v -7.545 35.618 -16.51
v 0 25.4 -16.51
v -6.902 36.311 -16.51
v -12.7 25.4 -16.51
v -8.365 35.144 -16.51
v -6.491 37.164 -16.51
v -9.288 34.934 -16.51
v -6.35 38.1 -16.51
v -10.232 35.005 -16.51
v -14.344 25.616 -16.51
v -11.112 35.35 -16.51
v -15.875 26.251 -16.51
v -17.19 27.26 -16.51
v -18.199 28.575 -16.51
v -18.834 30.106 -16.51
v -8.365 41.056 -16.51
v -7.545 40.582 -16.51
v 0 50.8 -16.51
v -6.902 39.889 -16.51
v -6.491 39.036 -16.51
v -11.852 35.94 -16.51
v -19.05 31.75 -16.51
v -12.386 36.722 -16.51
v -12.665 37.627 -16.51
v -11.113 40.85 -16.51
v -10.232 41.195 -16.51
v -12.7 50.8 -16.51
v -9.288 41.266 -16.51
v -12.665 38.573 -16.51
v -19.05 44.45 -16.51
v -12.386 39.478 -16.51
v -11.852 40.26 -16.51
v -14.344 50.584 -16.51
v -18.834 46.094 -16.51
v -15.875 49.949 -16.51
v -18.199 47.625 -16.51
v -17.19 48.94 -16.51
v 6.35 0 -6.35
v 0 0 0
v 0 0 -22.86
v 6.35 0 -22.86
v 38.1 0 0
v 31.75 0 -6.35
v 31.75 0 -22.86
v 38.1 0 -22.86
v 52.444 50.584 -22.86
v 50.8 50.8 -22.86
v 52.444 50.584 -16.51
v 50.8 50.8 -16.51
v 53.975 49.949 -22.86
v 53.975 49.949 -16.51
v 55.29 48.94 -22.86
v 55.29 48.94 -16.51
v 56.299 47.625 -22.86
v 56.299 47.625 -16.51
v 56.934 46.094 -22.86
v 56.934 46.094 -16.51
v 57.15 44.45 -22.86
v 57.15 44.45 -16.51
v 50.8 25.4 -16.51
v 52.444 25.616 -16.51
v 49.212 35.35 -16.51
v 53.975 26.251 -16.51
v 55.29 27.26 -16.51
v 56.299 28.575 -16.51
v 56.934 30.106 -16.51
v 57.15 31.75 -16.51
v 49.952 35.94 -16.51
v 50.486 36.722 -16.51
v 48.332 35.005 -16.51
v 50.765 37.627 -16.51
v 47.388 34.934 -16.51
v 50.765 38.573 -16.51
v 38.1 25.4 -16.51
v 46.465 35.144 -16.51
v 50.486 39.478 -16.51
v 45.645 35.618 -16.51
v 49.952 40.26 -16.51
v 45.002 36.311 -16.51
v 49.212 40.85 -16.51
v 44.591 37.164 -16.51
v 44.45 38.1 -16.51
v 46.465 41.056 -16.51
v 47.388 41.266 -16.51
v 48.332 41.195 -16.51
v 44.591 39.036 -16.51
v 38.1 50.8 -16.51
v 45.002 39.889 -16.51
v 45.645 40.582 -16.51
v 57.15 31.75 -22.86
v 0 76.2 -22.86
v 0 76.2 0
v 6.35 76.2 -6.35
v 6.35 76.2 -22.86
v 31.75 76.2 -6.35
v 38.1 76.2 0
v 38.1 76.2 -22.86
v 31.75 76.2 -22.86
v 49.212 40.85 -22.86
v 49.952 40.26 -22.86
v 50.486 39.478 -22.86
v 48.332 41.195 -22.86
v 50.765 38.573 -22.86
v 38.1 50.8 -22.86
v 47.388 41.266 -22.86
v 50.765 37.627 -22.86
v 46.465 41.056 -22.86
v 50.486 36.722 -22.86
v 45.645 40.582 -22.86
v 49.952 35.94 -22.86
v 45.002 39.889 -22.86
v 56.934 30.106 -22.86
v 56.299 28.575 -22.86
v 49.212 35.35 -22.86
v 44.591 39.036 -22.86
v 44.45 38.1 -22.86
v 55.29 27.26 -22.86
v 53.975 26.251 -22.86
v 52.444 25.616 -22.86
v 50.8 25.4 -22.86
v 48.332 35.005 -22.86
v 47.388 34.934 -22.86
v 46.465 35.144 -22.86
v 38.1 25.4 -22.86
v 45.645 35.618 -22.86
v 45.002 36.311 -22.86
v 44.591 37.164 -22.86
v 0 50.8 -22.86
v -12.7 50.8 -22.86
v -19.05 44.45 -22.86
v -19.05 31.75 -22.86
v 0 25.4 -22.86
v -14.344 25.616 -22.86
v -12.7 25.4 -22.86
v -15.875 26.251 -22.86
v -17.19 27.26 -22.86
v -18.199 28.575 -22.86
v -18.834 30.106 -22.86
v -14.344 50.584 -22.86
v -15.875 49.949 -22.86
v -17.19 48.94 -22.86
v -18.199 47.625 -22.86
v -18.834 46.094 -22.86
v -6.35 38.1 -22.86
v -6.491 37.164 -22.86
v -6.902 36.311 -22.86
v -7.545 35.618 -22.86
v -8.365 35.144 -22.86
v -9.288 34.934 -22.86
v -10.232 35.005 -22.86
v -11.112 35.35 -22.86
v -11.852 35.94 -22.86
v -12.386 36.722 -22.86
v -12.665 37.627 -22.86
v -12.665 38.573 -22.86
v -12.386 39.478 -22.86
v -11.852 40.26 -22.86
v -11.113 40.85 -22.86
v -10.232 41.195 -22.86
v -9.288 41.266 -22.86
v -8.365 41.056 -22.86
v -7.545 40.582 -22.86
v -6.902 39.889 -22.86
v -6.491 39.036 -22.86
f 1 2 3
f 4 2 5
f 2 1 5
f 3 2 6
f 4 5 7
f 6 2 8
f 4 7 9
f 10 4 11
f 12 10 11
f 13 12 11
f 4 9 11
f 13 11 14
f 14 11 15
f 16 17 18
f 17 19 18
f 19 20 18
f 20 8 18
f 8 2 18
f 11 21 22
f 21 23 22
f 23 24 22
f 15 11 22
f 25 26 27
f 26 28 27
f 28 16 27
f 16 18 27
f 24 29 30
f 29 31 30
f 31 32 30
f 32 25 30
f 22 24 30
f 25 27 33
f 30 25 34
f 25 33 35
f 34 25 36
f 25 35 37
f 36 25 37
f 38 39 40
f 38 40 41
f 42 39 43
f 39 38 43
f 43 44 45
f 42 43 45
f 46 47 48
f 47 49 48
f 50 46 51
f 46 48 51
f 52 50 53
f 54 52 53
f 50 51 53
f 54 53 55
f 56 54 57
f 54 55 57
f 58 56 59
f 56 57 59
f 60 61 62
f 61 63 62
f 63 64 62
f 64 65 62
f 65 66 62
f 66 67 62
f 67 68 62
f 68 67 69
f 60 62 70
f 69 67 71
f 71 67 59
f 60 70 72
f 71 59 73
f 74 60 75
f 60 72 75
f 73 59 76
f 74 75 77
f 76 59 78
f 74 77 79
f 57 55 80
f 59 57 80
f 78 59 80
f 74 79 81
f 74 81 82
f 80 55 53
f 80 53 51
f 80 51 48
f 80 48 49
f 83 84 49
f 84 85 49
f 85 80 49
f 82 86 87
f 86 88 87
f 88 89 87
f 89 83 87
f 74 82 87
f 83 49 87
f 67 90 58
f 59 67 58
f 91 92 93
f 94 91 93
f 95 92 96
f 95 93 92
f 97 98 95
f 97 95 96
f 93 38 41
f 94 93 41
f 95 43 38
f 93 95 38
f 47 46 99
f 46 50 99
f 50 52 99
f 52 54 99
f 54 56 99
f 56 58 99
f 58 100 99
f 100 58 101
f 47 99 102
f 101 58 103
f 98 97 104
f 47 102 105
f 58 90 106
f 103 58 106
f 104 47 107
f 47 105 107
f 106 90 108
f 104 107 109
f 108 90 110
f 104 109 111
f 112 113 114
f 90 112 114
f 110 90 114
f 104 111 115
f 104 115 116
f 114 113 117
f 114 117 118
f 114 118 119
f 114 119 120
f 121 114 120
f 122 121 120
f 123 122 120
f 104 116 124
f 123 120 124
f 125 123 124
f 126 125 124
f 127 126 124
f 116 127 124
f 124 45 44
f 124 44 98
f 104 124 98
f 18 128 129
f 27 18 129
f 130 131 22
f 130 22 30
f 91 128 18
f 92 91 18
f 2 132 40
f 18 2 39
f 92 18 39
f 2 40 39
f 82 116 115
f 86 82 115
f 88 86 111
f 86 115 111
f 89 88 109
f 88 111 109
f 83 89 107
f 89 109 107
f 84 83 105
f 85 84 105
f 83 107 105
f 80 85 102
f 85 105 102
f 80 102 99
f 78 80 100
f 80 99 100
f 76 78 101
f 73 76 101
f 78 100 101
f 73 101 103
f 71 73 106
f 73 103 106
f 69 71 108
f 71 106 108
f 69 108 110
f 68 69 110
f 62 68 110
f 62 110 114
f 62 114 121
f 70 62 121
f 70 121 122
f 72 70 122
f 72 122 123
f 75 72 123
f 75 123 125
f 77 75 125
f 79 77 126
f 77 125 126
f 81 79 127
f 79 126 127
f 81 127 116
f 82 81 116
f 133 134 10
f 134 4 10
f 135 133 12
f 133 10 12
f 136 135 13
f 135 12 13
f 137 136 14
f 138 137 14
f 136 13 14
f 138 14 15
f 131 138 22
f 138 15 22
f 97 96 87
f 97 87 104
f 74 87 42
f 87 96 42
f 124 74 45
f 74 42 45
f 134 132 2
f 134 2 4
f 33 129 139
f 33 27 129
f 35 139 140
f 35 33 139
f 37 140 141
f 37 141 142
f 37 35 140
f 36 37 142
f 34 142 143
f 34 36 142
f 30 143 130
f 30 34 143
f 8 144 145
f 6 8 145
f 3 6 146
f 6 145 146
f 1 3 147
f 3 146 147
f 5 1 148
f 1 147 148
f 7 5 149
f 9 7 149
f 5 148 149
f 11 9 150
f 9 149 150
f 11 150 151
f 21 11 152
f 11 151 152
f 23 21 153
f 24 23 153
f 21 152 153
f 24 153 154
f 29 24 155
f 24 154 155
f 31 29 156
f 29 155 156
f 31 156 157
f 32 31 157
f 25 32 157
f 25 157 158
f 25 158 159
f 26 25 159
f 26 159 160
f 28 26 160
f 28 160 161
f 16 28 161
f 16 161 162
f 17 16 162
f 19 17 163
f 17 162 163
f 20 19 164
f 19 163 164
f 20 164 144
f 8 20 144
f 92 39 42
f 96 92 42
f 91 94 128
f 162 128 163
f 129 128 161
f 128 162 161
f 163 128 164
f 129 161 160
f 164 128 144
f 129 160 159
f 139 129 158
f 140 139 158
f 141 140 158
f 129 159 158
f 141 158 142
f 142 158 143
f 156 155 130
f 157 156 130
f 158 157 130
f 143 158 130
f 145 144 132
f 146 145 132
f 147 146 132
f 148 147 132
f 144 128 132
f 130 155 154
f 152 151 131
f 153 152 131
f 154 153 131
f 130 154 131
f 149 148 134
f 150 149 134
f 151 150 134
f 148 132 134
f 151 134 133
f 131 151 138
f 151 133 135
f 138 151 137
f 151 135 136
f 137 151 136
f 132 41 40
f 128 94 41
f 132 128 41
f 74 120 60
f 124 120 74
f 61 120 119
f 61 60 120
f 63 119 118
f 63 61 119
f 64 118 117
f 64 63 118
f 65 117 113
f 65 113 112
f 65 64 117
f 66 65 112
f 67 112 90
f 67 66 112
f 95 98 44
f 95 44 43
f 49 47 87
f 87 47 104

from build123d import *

# Parameters (mm, degrees)
BOSS_EXTRUDE1_DEPTH = 76.2
SKETCH3_R           = 2.5019
BOSS_EXTRUDE2_DEPTH = 6.35
SKETCH4_W           = 19.05
SKETCH4_H           = 25.4
SKETCH4_R           = 3.175
BOSS_EXTRUDE3_DEPTH = 6.35
FILLET1_R           = 6.35
CUT_EXTRUDE1_REACH  = 99.955


with BuildPart() as part:
    # Sketch2 → Boss-Extrude1 (new body)
    with BuildSketch(Plane(origin=(0, 0, 0), x_dir=(1, 0, 0), z_dir=(0, 1, 0))):
        Polygon((0, 22.86), (0, 0), (38.1, 0), (38.1, 22.86), (31.75, 22.86), (31.75, 6.35), (6.35, 6.35), (6.35, 22.86), align=None)
    extrude(amount=BOSS_EXTRUDE1_DEPTH)

    # Sketch3 → Boss-Extrude2 (add)
    with BuildSketch(Plane.XY):
        with BuildLine():
            Line((19.05, 50.8), (-19.05, 50.8))
            ThreePointArc((-19.05, 50.8), (-31.75, 38.1), (-19.05, 25.4))
            Line((-19.05, 25.4), (19.05, 25.4))
            ThreePointArc((19.05, 25.4), (31.75, 38.1), (19.05, 50.8))
        make_face()
        with Locations((-19.05, 38.1)):
            Circle(SKETCH3_R, mode=Mode.SUBTRACT)
    extrude(amount=-BOSS_EXTRUDE2_DEPTH)

    # Sketch4 → Boss-Extrude3 (add)
    # profile 1 of 2: a face of its own
    with BuildSketch(Plane(origin=(0, 0, -22.86), x_dir=(-1, 0, 0), z_dir=(0, 0, -1))):
        with Locations((-47.625, 38.1)):
            Rectangle(SKETCH4_W, SKETCH4_H)
        with Locations((-47.625, 38.1)):
            Circle(SKETCH4_R, mode=Mode.SUBTRACT)
    # profile 2 of 2: a face of its own
    with BuildSketch(Plane(origin=(0, 0, -22.86), x_dir=(-1, 0, 0), z_dir=(0, 0, -1))):
        with Locations((9.525, 38.1)):
            Rectangle(SKETCH4_W, SKETCH4_H)
        with Locations(Location((9.525, 38.1, 0), (0, 0, 180))):
            Circle(SKETCH4_R, mode=Mode.SUBTRACT)
    extrude(amount=-BOSS_EXTRUDE3_DEPTH)

    # Fillet1
    fillet1_edges = [part.edges().sort_by_distance(p)[0] for p in [
        (57.15, 25.4, -19.685),
        (57.15, 50.8, -19.685),
        (-19.05, 50.8, -19.685),
        (-19.05, 25.4, -19.685),
    ]]
    fillet(fillet1_edges, radius=FILLET1_R)

    # Sketch5 → Cut-Extrude1 (cut, up to next)
    with BuildSketch(Plane.XY, mode=Mode.PRIVATE) as cut_extrude1_sk1:
        with BuildLine():
            Line((-19.05, 25.4), (0, 25.4))
            Line((0, 25.4), (0, 50.8))
            Line((0, 50.8), (-19.05, 50.8))
            ThreePointArc((-19.05, 50.8), (-31.75, 38.1), (-19.05, 25.4))
        make_face()
    cut_extrude1_tool1 = extrude(cut_extrude1_sk1.sketch, amount=-CUT_EXTRUDE1_REACH, mode=Mode.PRIVATE) & part.part
    add(cut_extrude1_tool1.solids().sort_by_distance((-14.650694, 38.1, 0))[0], mode=Mode.SUBTRACT)


solid = part.part
